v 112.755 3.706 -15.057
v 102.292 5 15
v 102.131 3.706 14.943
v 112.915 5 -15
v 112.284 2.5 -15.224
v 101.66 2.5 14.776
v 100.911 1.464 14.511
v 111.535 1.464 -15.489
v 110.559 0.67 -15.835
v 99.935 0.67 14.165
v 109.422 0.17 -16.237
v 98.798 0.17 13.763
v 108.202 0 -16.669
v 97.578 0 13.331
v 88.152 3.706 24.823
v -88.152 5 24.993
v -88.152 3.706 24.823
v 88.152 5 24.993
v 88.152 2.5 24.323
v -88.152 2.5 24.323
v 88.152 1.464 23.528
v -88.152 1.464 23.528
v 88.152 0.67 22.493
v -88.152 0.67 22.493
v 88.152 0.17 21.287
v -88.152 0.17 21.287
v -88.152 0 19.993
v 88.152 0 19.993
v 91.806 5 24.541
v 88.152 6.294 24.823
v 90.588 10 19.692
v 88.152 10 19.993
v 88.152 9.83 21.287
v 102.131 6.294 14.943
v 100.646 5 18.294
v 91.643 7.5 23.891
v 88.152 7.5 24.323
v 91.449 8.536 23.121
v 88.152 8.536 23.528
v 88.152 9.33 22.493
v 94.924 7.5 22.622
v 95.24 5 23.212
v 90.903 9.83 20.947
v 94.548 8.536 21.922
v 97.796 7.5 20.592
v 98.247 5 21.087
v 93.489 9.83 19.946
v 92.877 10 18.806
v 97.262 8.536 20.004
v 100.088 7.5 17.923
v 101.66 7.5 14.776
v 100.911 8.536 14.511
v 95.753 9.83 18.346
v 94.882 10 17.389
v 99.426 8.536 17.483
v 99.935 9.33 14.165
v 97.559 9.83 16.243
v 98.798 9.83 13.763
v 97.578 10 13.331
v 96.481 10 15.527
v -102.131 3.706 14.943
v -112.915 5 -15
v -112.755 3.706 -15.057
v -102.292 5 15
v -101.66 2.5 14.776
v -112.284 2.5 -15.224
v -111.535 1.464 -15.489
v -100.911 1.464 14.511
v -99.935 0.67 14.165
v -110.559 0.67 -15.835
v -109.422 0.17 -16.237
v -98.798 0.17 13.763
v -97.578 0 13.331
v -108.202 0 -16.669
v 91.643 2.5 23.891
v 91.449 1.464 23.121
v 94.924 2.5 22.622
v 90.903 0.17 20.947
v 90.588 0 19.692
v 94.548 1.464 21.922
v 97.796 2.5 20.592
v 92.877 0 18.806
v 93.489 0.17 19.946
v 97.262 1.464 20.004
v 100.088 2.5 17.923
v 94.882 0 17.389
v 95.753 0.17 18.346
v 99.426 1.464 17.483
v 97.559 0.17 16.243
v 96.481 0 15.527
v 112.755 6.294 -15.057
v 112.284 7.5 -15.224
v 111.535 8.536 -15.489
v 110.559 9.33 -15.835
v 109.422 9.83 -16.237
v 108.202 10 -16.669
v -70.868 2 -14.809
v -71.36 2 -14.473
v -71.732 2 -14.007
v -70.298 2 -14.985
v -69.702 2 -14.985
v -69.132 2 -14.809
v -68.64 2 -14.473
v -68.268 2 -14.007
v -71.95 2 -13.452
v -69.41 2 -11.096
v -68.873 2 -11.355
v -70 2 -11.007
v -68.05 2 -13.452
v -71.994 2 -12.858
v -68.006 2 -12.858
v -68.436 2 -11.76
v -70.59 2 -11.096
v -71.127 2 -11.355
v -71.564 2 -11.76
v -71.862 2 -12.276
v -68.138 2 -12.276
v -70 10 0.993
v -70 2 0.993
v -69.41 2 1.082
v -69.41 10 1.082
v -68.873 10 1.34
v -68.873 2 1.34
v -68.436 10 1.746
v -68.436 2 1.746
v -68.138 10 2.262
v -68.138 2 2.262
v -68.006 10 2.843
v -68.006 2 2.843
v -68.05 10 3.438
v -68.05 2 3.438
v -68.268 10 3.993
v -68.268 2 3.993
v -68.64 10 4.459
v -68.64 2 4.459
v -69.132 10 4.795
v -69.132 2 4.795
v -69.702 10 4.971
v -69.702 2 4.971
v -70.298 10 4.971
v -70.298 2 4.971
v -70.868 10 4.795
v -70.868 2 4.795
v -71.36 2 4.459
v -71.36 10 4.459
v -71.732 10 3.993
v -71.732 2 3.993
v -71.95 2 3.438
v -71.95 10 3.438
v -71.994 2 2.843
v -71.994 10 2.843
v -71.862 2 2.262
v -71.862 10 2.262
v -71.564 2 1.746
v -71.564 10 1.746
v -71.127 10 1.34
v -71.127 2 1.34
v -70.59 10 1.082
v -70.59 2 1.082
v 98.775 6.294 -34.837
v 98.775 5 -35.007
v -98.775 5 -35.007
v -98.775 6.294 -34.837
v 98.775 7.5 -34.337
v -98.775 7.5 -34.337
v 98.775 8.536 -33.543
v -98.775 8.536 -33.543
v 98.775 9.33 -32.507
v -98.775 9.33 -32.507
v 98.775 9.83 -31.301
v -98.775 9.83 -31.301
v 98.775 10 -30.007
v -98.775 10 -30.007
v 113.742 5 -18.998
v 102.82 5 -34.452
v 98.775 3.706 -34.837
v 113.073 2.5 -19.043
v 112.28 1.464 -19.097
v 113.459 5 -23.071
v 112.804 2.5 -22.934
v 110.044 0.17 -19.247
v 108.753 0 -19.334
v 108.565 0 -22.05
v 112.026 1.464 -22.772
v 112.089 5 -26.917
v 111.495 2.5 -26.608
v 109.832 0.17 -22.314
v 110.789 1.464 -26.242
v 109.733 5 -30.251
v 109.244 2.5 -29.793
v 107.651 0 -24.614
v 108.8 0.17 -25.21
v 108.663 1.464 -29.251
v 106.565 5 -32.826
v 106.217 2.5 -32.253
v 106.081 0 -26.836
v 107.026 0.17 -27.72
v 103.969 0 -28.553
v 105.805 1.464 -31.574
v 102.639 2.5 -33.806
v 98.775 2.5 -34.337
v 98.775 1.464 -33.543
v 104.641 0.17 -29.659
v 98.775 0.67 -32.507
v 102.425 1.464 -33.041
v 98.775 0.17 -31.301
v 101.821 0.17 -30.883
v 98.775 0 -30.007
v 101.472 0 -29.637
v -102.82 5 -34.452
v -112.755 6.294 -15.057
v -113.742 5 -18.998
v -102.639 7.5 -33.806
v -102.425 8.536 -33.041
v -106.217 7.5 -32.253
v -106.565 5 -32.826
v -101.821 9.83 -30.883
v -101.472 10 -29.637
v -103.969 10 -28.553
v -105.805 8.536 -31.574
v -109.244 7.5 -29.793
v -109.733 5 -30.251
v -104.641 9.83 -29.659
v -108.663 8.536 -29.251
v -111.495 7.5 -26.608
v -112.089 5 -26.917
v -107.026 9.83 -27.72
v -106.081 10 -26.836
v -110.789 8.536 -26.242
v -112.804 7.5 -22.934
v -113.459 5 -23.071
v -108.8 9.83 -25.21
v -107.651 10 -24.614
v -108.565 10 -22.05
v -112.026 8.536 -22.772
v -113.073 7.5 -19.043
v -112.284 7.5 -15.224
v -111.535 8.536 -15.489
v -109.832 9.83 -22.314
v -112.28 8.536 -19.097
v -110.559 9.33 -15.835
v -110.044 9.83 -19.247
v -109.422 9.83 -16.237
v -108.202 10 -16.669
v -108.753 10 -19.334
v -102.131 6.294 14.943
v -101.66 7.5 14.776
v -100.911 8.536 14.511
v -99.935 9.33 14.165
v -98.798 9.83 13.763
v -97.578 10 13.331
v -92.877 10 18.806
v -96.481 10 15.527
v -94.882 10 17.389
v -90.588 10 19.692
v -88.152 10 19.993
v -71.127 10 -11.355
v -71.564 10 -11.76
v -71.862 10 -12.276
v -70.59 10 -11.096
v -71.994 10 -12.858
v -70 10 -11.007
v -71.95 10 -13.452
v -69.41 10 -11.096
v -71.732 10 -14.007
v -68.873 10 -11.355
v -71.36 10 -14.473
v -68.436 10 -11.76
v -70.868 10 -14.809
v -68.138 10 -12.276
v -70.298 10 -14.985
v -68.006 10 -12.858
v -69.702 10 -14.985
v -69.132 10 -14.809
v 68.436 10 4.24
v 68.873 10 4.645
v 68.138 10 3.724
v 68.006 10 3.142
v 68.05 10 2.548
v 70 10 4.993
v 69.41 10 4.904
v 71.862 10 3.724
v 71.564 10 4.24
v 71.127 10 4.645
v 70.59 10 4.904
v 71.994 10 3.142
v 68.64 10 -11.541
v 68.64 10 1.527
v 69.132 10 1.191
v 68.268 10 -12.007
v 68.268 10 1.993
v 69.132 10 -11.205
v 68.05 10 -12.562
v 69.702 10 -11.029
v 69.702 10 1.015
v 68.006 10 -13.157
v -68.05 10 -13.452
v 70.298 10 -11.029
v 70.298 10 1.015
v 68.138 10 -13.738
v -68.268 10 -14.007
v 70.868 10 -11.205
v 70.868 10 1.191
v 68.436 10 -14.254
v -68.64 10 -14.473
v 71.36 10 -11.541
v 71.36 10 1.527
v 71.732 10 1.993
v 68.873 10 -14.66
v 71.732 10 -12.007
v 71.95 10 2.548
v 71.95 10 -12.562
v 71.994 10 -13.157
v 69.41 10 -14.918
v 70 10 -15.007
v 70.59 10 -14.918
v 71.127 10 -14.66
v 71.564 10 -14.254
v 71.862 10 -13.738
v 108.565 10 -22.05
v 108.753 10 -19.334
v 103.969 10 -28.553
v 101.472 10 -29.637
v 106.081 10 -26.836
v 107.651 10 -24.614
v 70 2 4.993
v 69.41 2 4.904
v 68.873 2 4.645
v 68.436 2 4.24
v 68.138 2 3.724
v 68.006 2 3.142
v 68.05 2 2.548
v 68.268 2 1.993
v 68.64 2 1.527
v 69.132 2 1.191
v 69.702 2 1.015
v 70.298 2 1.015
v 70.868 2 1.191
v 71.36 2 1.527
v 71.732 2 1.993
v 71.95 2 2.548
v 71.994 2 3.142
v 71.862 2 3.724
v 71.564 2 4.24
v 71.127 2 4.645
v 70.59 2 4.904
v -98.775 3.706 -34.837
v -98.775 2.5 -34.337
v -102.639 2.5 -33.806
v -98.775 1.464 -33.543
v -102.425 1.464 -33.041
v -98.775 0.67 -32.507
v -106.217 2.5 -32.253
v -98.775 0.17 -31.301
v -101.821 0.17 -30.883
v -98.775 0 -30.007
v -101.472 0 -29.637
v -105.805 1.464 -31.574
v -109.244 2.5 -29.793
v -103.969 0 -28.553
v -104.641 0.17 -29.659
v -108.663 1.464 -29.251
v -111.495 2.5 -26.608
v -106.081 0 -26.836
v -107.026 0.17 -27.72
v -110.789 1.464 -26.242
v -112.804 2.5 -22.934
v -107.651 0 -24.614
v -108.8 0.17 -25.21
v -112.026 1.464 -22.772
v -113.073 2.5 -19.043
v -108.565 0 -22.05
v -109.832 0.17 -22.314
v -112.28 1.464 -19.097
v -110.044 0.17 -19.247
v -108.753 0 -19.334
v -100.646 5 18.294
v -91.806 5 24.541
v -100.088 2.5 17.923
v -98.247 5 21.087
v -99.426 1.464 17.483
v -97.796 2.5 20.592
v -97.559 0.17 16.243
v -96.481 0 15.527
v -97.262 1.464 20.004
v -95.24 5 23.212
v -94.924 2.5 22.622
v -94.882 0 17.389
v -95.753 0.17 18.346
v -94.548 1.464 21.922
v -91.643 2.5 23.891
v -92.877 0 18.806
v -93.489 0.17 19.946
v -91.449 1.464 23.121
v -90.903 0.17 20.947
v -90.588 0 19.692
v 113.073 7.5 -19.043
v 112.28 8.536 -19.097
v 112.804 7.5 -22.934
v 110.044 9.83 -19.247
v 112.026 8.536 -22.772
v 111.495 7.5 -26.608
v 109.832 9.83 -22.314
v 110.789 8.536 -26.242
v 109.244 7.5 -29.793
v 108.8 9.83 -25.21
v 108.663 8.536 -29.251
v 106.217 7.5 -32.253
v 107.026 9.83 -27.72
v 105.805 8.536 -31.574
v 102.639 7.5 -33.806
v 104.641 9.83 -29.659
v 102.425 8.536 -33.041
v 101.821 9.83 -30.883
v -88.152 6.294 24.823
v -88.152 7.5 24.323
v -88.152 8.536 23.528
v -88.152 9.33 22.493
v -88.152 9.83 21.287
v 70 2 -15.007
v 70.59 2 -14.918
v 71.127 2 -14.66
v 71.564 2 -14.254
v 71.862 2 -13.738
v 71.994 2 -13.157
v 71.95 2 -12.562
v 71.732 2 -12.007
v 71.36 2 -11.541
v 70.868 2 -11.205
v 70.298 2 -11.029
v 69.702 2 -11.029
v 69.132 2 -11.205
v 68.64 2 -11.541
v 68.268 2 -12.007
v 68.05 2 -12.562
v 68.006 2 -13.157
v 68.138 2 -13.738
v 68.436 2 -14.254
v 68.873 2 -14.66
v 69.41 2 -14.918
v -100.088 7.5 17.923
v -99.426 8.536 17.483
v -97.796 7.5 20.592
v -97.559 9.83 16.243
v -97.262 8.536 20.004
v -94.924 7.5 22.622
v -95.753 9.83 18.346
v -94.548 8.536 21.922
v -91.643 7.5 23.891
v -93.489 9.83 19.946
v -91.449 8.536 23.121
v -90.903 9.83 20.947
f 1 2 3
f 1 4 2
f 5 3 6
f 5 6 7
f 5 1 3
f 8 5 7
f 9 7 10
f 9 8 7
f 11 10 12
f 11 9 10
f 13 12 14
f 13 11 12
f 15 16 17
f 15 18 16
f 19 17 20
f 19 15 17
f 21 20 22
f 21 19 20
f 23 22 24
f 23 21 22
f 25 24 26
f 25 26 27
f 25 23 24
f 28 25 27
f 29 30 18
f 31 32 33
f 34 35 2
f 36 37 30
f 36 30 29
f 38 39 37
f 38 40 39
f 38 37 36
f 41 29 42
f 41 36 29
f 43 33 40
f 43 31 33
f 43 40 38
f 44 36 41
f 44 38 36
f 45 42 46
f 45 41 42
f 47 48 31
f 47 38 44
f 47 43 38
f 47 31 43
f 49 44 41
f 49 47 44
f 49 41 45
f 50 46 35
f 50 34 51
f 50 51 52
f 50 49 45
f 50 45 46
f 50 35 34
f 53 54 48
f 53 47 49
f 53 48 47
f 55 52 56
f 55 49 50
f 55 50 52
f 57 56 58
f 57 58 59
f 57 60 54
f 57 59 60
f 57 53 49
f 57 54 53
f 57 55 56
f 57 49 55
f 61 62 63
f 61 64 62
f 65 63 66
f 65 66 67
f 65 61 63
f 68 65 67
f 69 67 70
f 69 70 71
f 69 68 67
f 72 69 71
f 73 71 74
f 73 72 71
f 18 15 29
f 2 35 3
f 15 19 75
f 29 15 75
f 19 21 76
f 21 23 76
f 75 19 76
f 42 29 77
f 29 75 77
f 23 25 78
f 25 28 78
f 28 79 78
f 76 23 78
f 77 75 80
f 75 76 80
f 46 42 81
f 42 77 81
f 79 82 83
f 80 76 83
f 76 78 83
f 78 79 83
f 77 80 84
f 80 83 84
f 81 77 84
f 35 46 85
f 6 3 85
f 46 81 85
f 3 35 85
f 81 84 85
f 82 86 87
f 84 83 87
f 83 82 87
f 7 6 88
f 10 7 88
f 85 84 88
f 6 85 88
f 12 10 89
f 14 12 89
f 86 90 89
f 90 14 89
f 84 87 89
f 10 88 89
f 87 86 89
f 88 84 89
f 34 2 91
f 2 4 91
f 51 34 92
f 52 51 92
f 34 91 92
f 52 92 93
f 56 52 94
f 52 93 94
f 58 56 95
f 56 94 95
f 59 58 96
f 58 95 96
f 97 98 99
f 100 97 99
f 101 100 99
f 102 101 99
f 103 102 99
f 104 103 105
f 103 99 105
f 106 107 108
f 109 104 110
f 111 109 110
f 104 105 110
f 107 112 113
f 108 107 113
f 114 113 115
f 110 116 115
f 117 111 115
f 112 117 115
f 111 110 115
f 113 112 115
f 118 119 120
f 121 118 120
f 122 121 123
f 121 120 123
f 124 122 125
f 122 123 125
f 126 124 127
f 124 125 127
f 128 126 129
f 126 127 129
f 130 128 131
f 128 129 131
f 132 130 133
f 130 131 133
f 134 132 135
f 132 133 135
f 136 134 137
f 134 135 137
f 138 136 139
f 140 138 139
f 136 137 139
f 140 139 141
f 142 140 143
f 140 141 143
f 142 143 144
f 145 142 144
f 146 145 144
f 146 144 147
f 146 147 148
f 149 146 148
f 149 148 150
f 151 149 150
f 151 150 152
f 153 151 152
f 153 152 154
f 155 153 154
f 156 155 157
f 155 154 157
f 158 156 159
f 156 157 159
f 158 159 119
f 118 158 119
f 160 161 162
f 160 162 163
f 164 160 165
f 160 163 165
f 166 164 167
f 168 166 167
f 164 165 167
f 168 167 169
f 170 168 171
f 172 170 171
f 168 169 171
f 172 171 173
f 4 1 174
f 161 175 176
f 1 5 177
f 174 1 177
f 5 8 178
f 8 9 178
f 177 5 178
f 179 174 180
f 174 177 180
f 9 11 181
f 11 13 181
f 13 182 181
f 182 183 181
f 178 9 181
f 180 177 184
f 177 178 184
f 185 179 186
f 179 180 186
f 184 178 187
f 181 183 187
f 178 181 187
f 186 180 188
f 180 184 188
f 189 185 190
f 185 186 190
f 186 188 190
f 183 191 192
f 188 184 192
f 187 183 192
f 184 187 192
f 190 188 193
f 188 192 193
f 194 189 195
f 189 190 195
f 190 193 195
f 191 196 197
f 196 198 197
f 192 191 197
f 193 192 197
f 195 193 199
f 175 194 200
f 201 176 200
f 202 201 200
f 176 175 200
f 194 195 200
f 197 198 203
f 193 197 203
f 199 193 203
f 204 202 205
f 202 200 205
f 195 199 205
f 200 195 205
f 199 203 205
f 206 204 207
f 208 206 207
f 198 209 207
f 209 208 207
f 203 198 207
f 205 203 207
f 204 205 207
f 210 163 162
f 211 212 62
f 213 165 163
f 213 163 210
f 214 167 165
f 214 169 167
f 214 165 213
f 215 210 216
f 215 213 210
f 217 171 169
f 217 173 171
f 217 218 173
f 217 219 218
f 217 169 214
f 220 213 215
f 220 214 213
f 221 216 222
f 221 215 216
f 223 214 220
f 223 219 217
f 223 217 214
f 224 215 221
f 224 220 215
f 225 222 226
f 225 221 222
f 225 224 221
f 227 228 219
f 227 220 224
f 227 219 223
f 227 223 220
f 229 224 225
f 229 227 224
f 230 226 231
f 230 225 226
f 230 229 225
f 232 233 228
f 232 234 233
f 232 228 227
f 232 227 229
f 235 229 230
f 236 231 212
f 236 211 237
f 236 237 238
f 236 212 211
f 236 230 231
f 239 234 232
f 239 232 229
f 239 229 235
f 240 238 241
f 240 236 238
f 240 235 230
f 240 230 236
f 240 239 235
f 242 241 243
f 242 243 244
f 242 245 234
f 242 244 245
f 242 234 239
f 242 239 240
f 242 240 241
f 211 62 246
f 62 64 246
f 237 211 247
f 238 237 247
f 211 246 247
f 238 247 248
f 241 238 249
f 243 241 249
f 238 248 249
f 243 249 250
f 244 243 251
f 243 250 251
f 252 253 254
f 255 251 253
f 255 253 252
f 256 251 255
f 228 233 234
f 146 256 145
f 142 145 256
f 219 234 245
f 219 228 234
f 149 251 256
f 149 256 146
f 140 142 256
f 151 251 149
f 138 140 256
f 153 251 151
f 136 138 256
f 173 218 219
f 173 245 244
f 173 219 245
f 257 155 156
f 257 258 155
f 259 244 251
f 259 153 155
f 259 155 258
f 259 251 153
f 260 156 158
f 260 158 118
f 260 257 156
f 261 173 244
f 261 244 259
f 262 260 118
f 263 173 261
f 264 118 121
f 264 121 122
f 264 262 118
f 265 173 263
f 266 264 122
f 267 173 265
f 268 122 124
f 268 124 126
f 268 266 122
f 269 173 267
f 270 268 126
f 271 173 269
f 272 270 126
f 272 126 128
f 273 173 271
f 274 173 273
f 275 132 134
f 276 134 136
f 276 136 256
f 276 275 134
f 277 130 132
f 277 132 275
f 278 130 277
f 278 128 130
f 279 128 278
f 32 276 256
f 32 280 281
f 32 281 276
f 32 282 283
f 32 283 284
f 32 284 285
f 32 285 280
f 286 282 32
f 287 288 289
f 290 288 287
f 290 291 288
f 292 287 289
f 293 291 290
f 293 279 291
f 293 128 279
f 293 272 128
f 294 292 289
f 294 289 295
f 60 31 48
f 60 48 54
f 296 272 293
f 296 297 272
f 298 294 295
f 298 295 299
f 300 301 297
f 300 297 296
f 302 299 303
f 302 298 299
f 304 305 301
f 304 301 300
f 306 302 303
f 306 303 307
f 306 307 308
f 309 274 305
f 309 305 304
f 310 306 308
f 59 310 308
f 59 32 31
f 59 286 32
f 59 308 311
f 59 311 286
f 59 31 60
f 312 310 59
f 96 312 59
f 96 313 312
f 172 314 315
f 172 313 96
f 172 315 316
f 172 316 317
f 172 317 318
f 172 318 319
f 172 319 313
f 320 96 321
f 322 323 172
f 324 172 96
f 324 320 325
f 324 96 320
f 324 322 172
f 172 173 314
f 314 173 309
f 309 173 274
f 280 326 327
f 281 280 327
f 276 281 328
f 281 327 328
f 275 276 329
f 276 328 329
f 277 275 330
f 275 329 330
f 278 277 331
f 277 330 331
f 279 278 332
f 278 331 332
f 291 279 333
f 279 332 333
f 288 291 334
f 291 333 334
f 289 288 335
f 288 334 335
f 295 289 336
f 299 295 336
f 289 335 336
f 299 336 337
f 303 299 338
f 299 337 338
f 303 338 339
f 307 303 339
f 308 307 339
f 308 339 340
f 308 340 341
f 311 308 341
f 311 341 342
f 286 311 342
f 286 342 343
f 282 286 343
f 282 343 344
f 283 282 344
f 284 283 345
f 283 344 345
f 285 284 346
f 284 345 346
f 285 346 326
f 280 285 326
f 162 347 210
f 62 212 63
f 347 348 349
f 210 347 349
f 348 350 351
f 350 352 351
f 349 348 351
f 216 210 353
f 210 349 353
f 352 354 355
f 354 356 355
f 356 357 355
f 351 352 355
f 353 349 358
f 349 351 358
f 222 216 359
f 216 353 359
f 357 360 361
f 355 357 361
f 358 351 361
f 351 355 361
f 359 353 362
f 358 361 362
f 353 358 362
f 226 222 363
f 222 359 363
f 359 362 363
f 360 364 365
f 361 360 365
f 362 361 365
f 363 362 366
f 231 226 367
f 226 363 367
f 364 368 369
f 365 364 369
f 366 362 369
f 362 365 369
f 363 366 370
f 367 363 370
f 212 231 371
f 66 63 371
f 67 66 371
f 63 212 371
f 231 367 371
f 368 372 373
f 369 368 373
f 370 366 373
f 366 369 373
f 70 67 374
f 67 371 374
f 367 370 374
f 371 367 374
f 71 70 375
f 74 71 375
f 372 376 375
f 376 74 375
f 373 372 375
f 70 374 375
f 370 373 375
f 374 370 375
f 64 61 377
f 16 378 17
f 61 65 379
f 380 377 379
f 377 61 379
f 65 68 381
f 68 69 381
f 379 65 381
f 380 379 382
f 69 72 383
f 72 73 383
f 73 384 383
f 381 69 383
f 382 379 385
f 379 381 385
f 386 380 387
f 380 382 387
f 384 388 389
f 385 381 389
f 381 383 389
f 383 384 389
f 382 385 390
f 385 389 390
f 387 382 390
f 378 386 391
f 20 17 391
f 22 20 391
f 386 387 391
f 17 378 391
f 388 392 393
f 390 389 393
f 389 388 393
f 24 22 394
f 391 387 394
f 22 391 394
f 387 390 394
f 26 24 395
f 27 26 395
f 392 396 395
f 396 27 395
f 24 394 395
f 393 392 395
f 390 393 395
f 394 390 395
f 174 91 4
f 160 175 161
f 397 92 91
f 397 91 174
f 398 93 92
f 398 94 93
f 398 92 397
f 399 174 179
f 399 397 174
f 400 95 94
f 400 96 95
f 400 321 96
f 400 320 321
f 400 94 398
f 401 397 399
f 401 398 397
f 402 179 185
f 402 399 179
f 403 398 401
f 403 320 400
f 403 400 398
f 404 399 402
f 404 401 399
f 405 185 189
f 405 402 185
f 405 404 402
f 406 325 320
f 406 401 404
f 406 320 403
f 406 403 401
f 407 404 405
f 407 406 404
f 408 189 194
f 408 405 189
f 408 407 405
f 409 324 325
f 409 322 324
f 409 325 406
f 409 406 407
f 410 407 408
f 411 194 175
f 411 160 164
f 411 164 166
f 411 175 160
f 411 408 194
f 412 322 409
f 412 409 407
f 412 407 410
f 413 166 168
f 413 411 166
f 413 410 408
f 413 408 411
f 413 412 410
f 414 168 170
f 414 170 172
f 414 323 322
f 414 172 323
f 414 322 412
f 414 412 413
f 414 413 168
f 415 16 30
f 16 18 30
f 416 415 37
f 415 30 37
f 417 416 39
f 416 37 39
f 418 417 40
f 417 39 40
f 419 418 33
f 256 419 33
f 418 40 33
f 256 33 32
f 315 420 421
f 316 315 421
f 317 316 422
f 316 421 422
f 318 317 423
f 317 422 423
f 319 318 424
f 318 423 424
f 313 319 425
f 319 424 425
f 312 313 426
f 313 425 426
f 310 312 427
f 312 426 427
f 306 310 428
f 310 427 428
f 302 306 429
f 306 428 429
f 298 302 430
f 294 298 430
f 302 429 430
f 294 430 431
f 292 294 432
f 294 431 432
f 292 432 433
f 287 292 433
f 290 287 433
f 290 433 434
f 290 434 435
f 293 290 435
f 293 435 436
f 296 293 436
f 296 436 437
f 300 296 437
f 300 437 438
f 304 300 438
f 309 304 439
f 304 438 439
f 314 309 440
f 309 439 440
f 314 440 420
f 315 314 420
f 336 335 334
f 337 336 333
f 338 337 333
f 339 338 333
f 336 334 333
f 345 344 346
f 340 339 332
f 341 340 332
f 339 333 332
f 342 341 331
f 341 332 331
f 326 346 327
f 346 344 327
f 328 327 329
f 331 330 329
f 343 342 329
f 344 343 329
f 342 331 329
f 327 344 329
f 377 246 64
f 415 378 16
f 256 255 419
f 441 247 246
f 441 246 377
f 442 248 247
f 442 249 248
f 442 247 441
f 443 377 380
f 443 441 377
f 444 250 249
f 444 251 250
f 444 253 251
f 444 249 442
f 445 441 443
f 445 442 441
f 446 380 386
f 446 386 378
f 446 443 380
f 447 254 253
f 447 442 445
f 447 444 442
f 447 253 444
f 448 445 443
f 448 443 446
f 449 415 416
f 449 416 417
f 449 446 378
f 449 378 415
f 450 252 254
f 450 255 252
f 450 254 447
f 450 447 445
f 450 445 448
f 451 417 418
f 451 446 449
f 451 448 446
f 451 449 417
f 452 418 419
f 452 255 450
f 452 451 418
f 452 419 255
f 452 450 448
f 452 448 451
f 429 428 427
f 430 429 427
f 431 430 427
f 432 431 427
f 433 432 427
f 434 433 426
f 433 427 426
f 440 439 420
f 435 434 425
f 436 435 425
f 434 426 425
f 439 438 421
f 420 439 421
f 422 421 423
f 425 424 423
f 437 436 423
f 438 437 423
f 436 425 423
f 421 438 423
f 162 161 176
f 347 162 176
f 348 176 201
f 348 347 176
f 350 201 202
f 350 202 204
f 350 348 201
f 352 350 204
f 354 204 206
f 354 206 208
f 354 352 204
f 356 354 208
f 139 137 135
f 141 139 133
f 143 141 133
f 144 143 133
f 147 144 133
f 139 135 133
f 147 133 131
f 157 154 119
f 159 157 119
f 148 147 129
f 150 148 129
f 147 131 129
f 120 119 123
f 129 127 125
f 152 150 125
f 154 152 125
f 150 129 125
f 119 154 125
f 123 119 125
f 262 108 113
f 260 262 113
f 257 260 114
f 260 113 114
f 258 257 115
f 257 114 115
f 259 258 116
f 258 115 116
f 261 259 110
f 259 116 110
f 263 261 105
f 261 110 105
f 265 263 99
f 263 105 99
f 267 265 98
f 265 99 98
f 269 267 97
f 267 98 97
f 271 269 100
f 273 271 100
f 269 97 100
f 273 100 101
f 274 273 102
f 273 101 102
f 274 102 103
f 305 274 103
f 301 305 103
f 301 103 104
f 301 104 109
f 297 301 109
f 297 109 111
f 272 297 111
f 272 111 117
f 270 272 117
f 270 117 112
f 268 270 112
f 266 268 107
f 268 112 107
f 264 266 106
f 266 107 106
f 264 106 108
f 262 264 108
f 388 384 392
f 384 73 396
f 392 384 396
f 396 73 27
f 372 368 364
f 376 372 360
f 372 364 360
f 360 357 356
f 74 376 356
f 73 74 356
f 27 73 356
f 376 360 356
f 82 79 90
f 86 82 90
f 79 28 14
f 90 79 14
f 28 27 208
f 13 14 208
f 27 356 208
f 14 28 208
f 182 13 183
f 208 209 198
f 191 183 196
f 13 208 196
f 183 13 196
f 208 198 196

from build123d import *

# Parameters (mm, degrees)
BOSS_EXTRUDE1_DEPTH = 10
FILLET1_R           = 5
CUT_EXTRUDE7_START  = -2
SKETCH5_R           = 2
CUT_EXTRUDE7_DEPTH  = 8


with BuildPart() as part:
    # Sketch1 → Boss-Extrude1 (new body)
    with BuildSketch(Plane(origin=(0, 0, 0), x_dir=(1, 0, 0), z_dir=(0, 1, 0))):
        with BuildLine():
            Line((-112.915113285, 15), (-102.291556109, -15))
            ThreePointArc((-102.291556109, -15), (-96.809111593, -22.242520439), (-88.151933742, -24.992897111))
            Line((-88.151933742, -24.992897111), (88.151933742, -24.992897111))
            ThreePointArc((88.151933742, -24.992897111), (96.809111593, -22.242520439), (102.291556109, -15))
            Line((102.291556109, -15), (112.915113285, 15))
            ThreePointArc((112.915113285, 15), (111.025114246, 28.664280739), (98.775490918, 35.007102889))
            Line((98.775490918, 35.007102889), (-98.775490918, 35.007102889))
            ThreePointArc((-98.775490918, 35.007102889), (-111.025114246, 28.664280739), (-112.915113285, 15))
        make_face()
    extrude(amount=BOSS_EXTRUDE1_DEPTH)

    # Fillet1
    fillet1_edges = [part.edges().sort_by_distance(p)[0] for p in [
        (0, 0, -35.007102889),
        (111.025114246, 0, -28.664280739),
        (107.603334697, 0, 0),
        (96.809111593, 0, 22.242520439),
        (0, 10, -35.007102889),
        (-111.025114246, 10, -28.664280739),
        (-107.603334697, 10, 0),
        (-96.809111593, 10, 22.242520439),
        (0, 10, 24.992897111),
        (0, 0, 24.992897111),
        (107.603334697, 10, 0),
        (-107.603334697, 0, 0),
    ]]
    fillet(fillet1_edges, radius=FILLET1_R - 0.0001)  # a hair under: the kernel refuses the full size

    # Sketch5 → Cut-Extrude7 (cut)
    with BuildSketch(Plane.XZ.offset(CUT_EXTRUDE7_START)):
        with Locations(Location((-70, 2.992897111, 0), (0, 0, 270))):
            Circle(SKETCH5_R)
        with Locations(Location((-70, -13.007102889, 0), (0, 0, 90))):
            Circle(SKETCH5_R)
        with Locations(Location((70, -13.007102889, 0), (0, 0, 270))):
            Circle(SKETCH5_R)
        with Locations(Location((70, 2.992897111, 0), (0, 0, 90))):
            Circle(SKETCH5_R)
    extrude(amount=-CUT_EXTRUDE7_DEPTH, mode=Mode.SUBTRACT)


solid = part.part
